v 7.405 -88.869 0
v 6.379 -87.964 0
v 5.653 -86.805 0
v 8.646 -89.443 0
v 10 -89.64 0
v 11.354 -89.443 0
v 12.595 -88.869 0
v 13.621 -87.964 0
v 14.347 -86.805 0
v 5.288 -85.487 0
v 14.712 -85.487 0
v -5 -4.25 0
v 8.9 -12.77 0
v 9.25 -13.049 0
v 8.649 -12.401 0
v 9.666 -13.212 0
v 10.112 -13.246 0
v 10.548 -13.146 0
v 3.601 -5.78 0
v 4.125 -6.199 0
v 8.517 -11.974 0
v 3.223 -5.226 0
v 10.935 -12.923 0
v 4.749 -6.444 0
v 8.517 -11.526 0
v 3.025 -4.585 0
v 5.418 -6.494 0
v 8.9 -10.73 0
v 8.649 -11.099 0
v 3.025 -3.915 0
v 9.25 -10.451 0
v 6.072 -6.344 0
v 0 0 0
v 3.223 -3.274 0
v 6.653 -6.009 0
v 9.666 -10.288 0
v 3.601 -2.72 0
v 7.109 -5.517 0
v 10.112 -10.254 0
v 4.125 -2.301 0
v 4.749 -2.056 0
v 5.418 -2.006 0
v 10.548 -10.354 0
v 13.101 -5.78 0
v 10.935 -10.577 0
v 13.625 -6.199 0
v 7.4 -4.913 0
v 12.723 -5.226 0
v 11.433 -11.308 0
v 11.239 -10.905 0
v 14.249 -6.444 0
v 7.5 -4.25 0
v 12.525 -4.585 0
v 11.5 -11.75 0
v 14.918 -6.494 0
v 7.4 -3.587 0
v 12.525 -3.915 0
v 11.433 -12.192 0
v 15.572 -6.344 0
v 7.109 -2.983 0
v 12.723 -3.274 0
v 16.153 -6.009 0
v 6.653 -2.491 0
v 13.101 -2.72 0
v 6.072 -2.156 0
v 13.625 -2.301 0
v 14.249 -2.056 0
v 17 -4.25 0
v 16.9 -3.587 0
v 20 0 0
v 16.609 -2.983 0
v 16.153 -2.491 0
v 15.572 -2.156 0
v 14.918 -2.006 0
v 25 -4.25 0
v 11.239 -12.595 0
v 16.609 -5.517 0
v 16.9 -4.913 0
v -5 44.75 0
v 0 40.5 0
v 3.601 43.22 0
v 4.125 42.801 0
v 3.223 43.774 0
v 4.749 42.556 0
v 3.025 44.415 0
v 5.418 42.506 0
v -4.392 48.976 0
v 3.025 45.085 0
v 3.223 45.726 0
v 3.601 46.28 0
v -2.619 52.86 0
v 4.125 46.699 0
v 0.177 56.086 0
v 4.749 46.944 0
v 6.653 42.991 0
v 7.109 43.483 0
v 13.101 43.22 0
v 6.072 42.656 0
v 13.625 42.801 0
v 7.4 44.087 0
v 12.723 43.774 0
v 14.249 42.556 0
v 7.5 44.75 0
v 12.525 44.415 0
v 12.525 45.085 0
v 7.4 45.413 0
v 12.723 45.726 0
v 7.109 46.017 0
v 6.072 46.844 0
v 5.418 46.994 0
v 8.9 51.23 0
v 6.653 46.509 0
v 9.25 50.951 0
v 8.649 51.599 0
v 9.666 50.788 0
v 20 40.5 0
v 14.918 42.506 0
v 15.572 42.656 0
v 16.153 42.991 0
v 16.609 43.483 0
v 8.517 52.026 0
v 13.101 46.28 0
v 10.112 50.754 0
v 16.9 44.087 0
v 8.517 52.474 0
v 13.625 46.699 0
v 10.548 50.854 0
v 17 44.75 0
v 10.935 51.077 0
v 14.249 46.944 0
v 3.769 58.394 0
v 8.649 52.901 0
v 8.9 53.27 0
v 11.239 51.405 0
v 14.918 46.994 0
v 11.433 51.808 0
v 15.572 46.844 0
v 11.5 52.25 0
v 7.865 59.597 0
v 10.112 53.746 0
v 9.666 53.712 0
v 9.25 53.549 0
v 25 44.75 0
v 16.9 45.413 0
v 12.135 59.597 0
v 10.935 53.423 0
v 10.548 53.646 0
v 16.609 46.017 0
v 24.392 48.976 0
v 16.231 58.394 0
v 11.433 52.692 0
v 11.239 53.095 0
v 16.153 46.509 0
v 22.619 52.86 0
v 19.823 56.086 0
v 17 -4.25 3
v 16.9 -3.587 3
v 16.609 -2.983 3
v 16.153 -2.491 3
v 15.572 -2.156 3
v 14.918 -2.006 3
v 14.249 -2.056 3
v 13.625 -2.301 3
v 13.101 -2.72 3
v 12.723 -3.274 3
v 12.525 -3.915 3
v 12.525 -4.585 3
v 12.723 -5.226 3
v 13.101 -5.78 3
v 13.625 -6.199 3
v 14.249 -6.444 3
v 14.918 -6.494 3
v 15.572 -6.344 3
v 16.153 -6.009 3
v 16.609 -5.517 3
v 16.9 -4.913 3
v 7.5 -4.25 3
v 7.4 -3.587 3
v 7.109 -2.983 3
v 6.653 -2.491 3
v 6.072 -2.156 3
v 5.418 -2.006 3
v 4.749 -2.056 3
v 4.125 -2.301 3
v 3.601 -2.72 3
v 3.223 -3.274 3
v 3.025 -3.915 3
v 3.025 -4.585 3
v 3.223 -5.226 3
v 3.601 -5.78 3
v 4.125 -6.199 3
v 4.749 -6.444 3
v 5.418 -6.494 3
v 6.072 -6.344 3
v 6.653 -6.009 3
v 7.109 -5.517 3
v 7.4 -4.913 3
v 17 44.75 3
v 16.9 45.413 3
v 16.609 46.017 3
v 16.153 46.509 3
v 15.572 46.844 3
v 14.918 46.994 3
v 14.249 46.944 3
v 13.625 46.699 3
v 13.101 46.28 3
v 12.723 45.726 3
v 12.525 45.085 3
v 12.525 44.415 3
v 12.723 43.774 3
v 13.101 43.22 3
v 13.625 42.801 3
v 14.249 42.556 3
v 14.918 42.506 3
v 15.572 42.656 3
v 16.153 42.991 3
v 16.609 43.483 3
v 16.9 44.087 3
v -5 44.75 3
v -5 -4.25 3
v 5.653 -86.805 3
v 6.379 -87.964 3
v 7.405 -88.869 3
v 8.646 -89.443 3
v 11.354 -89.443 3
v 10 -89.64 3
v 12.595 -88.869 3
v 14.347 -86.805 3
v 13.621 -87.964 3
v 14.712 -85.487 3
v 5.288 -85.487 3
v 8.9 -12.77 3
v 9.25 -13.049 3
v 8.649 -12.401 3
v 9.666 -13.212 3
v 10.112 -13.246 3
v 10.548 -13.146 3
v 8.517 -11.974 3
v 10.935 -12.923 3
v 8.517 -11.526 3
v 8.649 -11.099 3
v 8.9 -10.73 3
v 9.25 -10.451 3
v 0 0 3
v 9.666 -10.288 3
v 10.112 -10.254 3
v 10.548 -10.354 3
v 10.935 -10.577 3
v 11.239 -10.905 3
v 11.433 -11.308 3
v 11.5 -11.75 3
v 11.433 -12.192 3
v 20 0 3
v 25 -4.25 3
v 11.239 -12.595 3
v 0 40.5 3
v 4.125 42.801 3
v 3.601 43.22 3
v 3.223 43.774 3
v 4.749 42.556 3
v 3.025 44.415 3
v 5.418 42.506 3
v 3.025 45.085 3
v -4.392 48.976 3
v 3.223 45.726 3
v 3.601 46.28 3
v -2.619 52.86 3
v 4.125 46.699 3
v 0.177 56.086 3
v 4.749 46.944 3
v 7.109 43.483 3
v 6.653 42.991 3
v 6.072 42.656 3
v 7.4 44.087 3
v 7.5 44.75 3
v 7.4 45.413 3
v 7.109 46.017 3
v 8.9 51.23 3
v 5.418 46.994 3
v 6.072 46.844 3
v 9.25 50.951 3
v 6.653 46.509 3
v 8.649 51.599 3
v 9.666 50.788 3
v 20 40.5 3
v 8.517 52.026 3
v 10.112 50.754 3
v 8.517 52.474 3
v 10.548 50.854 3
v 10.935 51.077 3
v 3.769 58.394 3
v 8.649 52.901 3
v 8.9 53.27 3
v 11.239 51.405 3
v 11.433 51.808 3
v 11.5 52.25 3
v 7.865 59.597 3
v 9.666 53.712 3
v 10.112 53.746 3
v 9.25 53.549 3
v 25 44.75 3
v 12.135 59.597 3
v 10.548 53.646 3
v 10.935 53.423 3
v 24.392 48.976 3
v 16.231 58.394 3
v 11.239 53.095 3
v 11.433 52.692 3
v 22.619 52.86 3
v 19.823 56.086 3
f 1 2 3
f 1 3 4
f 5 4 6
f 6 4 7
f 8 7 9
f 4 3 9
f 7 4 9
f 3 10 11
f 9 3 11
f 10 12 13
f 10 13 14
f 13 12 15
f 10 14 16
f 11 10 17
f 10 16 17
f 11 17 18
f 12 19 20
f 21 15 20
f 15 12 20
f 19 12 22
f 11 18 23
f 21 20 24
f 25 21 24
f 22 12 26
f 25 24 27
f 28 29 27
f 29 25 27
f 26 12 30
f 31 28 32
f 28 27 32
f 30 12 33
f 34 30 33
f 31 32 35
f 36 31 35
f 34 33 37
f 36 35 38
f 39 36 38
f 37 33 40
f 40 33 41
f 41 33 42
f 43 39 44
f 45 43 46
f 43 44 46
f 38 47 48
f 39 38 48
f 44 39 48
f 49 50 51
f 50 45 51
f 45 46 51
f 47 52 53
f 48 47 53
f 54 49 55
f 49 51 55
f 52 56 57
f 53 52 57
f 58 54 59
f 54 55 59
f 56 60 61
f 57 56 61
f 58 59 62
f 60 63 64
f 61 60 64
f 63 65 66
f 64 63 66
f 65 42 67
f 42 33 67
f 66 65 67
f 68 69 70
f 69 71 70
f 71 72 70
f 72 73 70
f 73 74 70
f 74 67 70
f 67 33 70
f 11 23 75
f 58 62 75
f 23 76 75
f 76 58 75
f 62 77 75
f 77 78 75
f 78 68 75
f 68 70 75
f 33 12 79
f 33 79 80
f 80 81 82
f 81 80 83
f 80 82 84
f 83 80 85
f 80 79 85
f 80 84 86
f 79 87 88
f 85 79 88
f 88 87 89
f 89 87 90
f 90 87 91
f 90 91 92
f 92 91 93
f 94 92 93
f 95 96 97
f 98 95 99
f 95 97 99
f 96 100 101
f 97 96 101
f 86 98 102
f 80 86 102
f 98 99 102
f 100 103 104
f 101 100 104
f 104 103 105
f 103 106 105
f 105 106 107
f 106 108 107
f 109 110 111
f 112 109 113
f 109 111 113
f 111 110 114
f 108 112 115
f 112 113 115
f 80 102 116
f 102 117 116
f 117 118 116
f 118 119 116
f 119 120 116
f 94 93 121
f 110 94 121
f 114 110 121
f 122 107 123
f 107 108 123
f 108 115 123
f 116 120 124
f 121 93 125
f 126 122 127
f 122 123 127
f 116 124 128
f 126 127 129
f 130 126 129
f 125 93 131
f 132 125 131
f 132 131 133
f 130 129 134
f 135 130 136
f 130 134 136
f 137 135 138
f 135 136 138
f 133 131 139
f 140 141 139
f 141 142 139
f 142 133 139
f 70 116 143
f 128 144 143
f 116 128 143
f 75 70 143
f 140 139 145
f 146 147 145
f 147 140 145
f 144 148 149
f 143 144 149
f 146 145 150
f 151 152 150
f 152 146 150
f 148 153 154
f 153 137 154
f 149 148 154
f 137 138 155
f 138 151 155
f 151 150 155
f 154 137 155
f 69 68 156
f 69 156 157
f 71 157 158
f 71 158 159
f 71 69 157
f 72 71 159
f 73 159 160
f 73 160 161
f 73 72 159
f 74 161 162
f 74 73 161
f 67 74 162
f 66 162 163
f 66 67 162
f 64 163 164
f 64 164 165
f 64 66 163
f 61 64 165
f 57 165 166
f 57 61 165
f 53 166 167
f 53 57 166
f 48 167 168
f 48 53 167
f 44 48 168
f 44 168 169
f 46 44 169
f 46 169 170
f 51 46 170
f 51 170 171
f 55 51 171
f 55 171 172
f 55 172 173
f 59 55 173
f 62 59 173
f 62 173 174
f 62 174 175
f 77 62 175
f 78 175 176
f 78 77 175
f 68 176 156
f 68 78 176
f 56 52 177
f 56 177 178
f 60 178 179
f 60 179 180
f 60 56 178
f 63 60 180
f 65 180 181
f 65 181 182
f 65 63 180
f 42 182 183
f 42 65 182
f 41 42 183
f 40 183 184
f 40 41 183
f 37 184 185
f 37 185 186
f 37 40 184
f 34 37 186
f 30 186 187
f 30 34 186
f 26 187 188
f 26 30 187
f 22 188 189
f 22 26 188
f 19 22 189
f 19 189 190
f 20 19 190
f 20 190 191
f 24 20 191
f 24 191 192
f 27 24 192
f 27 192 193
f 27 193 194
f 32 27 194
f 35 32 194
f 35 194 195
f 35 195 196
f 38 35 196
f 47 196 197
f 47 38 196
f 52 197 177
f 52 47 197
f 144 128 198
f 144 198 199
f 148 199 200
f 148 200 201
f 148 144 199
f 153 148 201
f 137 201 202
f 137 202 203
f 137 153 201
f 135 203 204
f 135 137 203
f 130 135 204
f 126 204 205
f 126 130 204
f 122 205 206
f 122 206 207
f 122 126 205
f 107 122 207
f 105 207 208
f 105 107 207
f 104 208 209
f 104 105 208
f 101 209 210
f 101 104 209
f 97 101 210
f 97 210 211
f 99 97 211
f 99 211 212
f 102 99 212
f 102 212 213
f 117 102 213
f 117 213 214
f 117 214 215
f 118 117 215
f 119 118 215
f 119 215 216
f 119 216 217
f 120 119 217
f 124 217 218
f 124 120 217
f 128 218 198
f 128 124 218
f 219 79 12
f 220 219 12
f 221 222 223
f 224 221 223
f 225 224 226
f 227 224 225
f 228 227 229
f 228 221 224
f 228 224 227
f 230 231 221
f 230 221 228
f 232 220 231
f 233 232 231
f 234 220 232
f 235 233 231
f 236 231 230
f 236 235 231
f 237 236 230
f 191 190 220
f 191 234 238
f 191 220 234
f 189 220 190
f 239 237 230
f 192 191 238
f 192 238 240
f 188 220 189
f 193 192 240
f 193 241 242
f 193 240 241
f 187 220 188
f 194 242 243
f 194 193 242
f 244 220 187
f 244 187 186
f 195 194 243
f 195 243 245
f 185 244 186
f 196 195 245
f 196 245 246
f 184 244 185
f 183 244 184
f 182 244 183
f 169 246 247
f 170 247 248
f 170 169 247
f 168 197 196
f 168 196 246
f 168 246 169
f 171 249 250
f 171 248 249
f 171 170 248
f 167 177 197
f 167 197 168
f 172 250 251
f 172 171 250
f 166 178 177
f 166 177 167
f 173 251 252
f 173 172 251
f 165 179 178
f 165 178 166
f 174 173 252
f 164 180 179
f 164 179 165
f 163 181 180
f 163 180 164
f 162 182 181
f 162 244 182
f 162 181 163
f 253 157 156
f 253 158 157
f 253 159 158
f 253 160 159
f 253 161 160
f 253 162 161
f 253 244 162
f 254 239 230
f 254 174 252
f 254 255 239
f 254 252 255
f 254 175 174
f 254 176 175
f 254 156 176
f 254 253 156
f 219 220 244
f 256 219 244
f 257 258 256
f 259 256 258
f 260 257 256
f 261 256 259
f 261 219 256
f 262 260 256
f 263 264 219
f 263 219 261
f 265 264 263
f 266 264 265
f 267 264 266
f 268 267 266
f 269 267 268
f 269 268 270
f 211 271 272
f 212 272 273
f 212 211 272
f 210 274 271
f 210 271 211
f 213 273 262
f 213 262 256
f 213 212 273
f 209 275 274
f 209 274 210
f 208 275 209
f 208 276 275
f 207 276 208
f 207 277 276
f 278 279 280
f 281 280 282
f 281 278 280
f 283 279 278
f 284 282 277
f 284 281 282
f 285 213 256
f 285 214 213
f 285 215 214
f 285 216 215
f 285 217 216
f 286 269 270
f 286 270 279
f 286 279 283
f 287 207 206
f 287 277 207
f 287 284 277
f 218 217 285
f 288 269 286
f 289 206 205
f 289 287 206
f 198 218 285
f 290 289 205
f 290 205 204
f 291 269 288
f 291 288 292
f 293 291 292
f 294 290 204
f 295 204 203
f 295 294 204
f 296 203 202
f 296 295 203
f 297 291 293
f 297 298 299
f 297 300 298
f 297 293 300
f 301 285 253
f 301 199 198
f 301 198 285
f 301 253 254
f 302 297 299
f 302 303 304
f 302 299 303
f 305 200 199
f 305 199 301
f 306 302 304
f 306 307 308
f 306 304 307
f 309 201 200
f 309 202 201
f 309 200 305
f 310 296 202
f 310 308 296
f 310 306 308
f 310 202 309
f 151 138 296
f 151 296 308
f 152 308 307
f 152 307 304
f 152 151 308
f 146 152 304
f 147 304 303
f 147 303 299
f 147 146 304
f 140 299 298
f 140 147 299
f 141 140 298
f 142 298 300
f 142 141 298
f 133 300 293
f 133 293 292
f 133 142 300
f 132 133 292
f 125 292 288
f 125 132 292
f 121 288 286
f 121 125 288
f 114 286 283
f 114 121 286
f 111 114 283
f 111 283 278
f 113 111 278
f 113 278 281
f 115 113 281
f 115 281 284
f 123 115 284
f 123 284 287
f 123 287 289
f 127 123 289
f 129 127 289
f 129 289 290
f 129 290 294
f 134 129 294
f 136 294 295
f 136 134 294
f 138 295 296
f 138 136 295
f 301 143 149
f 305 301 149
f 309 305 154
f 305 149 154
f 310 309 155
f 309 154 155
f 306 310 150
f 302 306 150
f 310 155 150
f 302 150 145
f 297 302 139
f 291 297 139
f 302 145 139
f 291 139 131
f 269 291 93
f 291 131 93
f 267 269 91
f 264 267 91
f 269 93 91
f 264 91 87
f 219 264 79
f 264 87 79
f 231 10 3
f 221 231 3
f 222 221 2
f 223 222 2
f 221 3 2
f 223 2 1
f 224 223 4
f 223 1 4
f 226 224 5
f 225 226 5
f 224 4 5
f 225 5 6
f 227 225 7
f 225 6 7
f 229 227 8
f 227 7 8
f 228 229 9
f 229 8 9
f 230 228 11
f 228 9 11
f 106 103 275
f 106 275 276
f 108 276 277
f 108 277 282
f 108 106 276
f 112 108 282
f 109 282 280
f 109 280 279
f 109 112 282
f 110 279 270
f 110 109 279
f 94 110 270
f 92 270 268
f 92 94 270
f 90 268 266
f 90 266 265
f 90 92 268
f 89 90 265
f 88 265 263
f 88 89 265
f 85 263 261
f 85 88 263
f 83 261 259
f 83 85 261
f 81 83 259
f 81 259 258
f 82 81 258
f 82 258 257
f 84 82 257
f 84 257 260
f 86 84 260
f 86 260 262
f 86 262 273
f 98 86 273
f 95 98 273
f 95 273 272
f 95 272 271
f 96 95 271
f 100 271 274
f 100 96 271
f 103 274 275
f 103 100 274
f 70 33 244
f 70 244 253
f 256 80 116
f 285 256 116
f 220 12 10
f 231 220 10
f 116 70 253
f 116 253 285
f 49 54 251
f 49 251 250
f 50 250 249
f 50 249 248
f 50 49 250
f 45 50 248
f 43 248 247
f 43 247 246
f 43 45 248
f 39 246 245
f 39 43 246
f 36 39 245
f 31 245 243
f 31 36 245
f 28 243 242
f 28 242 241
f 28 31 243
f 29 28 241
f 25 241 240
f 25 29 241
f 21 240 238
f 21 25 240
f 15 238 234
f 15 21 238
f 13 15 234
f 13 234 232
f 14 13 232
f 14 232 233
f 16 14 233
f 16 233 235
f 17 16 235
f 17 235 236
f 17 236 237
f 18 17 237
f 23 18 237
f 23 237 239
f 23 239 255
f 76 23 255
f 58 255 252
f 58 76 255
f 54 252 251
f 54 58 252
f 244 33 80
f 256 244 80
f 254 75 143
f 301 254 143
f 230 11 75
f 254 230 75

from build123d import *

# Parameters (mm, degrees)
SKETCH1_R           = 2.25
SKETCH1_R_2         = 1.5
SKETCH1_W           = 20
SKETCH1_H           = 40.5
BOSS_EXTRUDE1_DEPTH = 3


with BuildPart() as part:
    # Sketch1 → Boss-Extrude1 (new body)
    with BuildSketch(Plane.XY):
        with BuildLine():
            Line((-5, 44.75), (-5, -4.25))
            Line((-5, -4.25), (5.287636044, -85.486762889))
            ThreePointArc((5.287636044, -85.486762889), (10, -89.64), (14.712363956, -85.486762889))
            Line((14.712363956, -85.486762889), (25, -4.25))
            Line((25, -4.25), (25, 44.75))
            ThreePointArc((25, 44.75), (10, 59.75), (-5, 44.75))
        make_face()
        with Locations((14.75, -4.25)):
            Circle(SKETCH1_R, mode=Mode.SUBTRACT)
        with Locations((5.25, -4.25)):
            Circle(SKETCH1_R, mode=Mode.SUBTRACT)
        with Locations((14.75, 44.75)):
            Circle(SKETCH1_R, mode=Mode.SUBTRACT)
        with Locations((5.25, 44.75)):
            Circle(SKETCH1_R, mode=Mode.SUBTRACT)
        with Locations((10, 52.25)):
            Circle(SKETCH1_R_2, mode=Mode.SUBTRACT)
        with Locations((10, -11.75)):
            Circle(SKETCH1_R_2, mode=Mode.SUBTRACT)
        with Locations((10, 20.25)):
            Rectangle(SKETCH1_W, SKETCH1_H, mode=Mode.SUBTRACT)
    extrude(amount=BOSS_EXTRUDE1_DEPTH)


solid = part.part
